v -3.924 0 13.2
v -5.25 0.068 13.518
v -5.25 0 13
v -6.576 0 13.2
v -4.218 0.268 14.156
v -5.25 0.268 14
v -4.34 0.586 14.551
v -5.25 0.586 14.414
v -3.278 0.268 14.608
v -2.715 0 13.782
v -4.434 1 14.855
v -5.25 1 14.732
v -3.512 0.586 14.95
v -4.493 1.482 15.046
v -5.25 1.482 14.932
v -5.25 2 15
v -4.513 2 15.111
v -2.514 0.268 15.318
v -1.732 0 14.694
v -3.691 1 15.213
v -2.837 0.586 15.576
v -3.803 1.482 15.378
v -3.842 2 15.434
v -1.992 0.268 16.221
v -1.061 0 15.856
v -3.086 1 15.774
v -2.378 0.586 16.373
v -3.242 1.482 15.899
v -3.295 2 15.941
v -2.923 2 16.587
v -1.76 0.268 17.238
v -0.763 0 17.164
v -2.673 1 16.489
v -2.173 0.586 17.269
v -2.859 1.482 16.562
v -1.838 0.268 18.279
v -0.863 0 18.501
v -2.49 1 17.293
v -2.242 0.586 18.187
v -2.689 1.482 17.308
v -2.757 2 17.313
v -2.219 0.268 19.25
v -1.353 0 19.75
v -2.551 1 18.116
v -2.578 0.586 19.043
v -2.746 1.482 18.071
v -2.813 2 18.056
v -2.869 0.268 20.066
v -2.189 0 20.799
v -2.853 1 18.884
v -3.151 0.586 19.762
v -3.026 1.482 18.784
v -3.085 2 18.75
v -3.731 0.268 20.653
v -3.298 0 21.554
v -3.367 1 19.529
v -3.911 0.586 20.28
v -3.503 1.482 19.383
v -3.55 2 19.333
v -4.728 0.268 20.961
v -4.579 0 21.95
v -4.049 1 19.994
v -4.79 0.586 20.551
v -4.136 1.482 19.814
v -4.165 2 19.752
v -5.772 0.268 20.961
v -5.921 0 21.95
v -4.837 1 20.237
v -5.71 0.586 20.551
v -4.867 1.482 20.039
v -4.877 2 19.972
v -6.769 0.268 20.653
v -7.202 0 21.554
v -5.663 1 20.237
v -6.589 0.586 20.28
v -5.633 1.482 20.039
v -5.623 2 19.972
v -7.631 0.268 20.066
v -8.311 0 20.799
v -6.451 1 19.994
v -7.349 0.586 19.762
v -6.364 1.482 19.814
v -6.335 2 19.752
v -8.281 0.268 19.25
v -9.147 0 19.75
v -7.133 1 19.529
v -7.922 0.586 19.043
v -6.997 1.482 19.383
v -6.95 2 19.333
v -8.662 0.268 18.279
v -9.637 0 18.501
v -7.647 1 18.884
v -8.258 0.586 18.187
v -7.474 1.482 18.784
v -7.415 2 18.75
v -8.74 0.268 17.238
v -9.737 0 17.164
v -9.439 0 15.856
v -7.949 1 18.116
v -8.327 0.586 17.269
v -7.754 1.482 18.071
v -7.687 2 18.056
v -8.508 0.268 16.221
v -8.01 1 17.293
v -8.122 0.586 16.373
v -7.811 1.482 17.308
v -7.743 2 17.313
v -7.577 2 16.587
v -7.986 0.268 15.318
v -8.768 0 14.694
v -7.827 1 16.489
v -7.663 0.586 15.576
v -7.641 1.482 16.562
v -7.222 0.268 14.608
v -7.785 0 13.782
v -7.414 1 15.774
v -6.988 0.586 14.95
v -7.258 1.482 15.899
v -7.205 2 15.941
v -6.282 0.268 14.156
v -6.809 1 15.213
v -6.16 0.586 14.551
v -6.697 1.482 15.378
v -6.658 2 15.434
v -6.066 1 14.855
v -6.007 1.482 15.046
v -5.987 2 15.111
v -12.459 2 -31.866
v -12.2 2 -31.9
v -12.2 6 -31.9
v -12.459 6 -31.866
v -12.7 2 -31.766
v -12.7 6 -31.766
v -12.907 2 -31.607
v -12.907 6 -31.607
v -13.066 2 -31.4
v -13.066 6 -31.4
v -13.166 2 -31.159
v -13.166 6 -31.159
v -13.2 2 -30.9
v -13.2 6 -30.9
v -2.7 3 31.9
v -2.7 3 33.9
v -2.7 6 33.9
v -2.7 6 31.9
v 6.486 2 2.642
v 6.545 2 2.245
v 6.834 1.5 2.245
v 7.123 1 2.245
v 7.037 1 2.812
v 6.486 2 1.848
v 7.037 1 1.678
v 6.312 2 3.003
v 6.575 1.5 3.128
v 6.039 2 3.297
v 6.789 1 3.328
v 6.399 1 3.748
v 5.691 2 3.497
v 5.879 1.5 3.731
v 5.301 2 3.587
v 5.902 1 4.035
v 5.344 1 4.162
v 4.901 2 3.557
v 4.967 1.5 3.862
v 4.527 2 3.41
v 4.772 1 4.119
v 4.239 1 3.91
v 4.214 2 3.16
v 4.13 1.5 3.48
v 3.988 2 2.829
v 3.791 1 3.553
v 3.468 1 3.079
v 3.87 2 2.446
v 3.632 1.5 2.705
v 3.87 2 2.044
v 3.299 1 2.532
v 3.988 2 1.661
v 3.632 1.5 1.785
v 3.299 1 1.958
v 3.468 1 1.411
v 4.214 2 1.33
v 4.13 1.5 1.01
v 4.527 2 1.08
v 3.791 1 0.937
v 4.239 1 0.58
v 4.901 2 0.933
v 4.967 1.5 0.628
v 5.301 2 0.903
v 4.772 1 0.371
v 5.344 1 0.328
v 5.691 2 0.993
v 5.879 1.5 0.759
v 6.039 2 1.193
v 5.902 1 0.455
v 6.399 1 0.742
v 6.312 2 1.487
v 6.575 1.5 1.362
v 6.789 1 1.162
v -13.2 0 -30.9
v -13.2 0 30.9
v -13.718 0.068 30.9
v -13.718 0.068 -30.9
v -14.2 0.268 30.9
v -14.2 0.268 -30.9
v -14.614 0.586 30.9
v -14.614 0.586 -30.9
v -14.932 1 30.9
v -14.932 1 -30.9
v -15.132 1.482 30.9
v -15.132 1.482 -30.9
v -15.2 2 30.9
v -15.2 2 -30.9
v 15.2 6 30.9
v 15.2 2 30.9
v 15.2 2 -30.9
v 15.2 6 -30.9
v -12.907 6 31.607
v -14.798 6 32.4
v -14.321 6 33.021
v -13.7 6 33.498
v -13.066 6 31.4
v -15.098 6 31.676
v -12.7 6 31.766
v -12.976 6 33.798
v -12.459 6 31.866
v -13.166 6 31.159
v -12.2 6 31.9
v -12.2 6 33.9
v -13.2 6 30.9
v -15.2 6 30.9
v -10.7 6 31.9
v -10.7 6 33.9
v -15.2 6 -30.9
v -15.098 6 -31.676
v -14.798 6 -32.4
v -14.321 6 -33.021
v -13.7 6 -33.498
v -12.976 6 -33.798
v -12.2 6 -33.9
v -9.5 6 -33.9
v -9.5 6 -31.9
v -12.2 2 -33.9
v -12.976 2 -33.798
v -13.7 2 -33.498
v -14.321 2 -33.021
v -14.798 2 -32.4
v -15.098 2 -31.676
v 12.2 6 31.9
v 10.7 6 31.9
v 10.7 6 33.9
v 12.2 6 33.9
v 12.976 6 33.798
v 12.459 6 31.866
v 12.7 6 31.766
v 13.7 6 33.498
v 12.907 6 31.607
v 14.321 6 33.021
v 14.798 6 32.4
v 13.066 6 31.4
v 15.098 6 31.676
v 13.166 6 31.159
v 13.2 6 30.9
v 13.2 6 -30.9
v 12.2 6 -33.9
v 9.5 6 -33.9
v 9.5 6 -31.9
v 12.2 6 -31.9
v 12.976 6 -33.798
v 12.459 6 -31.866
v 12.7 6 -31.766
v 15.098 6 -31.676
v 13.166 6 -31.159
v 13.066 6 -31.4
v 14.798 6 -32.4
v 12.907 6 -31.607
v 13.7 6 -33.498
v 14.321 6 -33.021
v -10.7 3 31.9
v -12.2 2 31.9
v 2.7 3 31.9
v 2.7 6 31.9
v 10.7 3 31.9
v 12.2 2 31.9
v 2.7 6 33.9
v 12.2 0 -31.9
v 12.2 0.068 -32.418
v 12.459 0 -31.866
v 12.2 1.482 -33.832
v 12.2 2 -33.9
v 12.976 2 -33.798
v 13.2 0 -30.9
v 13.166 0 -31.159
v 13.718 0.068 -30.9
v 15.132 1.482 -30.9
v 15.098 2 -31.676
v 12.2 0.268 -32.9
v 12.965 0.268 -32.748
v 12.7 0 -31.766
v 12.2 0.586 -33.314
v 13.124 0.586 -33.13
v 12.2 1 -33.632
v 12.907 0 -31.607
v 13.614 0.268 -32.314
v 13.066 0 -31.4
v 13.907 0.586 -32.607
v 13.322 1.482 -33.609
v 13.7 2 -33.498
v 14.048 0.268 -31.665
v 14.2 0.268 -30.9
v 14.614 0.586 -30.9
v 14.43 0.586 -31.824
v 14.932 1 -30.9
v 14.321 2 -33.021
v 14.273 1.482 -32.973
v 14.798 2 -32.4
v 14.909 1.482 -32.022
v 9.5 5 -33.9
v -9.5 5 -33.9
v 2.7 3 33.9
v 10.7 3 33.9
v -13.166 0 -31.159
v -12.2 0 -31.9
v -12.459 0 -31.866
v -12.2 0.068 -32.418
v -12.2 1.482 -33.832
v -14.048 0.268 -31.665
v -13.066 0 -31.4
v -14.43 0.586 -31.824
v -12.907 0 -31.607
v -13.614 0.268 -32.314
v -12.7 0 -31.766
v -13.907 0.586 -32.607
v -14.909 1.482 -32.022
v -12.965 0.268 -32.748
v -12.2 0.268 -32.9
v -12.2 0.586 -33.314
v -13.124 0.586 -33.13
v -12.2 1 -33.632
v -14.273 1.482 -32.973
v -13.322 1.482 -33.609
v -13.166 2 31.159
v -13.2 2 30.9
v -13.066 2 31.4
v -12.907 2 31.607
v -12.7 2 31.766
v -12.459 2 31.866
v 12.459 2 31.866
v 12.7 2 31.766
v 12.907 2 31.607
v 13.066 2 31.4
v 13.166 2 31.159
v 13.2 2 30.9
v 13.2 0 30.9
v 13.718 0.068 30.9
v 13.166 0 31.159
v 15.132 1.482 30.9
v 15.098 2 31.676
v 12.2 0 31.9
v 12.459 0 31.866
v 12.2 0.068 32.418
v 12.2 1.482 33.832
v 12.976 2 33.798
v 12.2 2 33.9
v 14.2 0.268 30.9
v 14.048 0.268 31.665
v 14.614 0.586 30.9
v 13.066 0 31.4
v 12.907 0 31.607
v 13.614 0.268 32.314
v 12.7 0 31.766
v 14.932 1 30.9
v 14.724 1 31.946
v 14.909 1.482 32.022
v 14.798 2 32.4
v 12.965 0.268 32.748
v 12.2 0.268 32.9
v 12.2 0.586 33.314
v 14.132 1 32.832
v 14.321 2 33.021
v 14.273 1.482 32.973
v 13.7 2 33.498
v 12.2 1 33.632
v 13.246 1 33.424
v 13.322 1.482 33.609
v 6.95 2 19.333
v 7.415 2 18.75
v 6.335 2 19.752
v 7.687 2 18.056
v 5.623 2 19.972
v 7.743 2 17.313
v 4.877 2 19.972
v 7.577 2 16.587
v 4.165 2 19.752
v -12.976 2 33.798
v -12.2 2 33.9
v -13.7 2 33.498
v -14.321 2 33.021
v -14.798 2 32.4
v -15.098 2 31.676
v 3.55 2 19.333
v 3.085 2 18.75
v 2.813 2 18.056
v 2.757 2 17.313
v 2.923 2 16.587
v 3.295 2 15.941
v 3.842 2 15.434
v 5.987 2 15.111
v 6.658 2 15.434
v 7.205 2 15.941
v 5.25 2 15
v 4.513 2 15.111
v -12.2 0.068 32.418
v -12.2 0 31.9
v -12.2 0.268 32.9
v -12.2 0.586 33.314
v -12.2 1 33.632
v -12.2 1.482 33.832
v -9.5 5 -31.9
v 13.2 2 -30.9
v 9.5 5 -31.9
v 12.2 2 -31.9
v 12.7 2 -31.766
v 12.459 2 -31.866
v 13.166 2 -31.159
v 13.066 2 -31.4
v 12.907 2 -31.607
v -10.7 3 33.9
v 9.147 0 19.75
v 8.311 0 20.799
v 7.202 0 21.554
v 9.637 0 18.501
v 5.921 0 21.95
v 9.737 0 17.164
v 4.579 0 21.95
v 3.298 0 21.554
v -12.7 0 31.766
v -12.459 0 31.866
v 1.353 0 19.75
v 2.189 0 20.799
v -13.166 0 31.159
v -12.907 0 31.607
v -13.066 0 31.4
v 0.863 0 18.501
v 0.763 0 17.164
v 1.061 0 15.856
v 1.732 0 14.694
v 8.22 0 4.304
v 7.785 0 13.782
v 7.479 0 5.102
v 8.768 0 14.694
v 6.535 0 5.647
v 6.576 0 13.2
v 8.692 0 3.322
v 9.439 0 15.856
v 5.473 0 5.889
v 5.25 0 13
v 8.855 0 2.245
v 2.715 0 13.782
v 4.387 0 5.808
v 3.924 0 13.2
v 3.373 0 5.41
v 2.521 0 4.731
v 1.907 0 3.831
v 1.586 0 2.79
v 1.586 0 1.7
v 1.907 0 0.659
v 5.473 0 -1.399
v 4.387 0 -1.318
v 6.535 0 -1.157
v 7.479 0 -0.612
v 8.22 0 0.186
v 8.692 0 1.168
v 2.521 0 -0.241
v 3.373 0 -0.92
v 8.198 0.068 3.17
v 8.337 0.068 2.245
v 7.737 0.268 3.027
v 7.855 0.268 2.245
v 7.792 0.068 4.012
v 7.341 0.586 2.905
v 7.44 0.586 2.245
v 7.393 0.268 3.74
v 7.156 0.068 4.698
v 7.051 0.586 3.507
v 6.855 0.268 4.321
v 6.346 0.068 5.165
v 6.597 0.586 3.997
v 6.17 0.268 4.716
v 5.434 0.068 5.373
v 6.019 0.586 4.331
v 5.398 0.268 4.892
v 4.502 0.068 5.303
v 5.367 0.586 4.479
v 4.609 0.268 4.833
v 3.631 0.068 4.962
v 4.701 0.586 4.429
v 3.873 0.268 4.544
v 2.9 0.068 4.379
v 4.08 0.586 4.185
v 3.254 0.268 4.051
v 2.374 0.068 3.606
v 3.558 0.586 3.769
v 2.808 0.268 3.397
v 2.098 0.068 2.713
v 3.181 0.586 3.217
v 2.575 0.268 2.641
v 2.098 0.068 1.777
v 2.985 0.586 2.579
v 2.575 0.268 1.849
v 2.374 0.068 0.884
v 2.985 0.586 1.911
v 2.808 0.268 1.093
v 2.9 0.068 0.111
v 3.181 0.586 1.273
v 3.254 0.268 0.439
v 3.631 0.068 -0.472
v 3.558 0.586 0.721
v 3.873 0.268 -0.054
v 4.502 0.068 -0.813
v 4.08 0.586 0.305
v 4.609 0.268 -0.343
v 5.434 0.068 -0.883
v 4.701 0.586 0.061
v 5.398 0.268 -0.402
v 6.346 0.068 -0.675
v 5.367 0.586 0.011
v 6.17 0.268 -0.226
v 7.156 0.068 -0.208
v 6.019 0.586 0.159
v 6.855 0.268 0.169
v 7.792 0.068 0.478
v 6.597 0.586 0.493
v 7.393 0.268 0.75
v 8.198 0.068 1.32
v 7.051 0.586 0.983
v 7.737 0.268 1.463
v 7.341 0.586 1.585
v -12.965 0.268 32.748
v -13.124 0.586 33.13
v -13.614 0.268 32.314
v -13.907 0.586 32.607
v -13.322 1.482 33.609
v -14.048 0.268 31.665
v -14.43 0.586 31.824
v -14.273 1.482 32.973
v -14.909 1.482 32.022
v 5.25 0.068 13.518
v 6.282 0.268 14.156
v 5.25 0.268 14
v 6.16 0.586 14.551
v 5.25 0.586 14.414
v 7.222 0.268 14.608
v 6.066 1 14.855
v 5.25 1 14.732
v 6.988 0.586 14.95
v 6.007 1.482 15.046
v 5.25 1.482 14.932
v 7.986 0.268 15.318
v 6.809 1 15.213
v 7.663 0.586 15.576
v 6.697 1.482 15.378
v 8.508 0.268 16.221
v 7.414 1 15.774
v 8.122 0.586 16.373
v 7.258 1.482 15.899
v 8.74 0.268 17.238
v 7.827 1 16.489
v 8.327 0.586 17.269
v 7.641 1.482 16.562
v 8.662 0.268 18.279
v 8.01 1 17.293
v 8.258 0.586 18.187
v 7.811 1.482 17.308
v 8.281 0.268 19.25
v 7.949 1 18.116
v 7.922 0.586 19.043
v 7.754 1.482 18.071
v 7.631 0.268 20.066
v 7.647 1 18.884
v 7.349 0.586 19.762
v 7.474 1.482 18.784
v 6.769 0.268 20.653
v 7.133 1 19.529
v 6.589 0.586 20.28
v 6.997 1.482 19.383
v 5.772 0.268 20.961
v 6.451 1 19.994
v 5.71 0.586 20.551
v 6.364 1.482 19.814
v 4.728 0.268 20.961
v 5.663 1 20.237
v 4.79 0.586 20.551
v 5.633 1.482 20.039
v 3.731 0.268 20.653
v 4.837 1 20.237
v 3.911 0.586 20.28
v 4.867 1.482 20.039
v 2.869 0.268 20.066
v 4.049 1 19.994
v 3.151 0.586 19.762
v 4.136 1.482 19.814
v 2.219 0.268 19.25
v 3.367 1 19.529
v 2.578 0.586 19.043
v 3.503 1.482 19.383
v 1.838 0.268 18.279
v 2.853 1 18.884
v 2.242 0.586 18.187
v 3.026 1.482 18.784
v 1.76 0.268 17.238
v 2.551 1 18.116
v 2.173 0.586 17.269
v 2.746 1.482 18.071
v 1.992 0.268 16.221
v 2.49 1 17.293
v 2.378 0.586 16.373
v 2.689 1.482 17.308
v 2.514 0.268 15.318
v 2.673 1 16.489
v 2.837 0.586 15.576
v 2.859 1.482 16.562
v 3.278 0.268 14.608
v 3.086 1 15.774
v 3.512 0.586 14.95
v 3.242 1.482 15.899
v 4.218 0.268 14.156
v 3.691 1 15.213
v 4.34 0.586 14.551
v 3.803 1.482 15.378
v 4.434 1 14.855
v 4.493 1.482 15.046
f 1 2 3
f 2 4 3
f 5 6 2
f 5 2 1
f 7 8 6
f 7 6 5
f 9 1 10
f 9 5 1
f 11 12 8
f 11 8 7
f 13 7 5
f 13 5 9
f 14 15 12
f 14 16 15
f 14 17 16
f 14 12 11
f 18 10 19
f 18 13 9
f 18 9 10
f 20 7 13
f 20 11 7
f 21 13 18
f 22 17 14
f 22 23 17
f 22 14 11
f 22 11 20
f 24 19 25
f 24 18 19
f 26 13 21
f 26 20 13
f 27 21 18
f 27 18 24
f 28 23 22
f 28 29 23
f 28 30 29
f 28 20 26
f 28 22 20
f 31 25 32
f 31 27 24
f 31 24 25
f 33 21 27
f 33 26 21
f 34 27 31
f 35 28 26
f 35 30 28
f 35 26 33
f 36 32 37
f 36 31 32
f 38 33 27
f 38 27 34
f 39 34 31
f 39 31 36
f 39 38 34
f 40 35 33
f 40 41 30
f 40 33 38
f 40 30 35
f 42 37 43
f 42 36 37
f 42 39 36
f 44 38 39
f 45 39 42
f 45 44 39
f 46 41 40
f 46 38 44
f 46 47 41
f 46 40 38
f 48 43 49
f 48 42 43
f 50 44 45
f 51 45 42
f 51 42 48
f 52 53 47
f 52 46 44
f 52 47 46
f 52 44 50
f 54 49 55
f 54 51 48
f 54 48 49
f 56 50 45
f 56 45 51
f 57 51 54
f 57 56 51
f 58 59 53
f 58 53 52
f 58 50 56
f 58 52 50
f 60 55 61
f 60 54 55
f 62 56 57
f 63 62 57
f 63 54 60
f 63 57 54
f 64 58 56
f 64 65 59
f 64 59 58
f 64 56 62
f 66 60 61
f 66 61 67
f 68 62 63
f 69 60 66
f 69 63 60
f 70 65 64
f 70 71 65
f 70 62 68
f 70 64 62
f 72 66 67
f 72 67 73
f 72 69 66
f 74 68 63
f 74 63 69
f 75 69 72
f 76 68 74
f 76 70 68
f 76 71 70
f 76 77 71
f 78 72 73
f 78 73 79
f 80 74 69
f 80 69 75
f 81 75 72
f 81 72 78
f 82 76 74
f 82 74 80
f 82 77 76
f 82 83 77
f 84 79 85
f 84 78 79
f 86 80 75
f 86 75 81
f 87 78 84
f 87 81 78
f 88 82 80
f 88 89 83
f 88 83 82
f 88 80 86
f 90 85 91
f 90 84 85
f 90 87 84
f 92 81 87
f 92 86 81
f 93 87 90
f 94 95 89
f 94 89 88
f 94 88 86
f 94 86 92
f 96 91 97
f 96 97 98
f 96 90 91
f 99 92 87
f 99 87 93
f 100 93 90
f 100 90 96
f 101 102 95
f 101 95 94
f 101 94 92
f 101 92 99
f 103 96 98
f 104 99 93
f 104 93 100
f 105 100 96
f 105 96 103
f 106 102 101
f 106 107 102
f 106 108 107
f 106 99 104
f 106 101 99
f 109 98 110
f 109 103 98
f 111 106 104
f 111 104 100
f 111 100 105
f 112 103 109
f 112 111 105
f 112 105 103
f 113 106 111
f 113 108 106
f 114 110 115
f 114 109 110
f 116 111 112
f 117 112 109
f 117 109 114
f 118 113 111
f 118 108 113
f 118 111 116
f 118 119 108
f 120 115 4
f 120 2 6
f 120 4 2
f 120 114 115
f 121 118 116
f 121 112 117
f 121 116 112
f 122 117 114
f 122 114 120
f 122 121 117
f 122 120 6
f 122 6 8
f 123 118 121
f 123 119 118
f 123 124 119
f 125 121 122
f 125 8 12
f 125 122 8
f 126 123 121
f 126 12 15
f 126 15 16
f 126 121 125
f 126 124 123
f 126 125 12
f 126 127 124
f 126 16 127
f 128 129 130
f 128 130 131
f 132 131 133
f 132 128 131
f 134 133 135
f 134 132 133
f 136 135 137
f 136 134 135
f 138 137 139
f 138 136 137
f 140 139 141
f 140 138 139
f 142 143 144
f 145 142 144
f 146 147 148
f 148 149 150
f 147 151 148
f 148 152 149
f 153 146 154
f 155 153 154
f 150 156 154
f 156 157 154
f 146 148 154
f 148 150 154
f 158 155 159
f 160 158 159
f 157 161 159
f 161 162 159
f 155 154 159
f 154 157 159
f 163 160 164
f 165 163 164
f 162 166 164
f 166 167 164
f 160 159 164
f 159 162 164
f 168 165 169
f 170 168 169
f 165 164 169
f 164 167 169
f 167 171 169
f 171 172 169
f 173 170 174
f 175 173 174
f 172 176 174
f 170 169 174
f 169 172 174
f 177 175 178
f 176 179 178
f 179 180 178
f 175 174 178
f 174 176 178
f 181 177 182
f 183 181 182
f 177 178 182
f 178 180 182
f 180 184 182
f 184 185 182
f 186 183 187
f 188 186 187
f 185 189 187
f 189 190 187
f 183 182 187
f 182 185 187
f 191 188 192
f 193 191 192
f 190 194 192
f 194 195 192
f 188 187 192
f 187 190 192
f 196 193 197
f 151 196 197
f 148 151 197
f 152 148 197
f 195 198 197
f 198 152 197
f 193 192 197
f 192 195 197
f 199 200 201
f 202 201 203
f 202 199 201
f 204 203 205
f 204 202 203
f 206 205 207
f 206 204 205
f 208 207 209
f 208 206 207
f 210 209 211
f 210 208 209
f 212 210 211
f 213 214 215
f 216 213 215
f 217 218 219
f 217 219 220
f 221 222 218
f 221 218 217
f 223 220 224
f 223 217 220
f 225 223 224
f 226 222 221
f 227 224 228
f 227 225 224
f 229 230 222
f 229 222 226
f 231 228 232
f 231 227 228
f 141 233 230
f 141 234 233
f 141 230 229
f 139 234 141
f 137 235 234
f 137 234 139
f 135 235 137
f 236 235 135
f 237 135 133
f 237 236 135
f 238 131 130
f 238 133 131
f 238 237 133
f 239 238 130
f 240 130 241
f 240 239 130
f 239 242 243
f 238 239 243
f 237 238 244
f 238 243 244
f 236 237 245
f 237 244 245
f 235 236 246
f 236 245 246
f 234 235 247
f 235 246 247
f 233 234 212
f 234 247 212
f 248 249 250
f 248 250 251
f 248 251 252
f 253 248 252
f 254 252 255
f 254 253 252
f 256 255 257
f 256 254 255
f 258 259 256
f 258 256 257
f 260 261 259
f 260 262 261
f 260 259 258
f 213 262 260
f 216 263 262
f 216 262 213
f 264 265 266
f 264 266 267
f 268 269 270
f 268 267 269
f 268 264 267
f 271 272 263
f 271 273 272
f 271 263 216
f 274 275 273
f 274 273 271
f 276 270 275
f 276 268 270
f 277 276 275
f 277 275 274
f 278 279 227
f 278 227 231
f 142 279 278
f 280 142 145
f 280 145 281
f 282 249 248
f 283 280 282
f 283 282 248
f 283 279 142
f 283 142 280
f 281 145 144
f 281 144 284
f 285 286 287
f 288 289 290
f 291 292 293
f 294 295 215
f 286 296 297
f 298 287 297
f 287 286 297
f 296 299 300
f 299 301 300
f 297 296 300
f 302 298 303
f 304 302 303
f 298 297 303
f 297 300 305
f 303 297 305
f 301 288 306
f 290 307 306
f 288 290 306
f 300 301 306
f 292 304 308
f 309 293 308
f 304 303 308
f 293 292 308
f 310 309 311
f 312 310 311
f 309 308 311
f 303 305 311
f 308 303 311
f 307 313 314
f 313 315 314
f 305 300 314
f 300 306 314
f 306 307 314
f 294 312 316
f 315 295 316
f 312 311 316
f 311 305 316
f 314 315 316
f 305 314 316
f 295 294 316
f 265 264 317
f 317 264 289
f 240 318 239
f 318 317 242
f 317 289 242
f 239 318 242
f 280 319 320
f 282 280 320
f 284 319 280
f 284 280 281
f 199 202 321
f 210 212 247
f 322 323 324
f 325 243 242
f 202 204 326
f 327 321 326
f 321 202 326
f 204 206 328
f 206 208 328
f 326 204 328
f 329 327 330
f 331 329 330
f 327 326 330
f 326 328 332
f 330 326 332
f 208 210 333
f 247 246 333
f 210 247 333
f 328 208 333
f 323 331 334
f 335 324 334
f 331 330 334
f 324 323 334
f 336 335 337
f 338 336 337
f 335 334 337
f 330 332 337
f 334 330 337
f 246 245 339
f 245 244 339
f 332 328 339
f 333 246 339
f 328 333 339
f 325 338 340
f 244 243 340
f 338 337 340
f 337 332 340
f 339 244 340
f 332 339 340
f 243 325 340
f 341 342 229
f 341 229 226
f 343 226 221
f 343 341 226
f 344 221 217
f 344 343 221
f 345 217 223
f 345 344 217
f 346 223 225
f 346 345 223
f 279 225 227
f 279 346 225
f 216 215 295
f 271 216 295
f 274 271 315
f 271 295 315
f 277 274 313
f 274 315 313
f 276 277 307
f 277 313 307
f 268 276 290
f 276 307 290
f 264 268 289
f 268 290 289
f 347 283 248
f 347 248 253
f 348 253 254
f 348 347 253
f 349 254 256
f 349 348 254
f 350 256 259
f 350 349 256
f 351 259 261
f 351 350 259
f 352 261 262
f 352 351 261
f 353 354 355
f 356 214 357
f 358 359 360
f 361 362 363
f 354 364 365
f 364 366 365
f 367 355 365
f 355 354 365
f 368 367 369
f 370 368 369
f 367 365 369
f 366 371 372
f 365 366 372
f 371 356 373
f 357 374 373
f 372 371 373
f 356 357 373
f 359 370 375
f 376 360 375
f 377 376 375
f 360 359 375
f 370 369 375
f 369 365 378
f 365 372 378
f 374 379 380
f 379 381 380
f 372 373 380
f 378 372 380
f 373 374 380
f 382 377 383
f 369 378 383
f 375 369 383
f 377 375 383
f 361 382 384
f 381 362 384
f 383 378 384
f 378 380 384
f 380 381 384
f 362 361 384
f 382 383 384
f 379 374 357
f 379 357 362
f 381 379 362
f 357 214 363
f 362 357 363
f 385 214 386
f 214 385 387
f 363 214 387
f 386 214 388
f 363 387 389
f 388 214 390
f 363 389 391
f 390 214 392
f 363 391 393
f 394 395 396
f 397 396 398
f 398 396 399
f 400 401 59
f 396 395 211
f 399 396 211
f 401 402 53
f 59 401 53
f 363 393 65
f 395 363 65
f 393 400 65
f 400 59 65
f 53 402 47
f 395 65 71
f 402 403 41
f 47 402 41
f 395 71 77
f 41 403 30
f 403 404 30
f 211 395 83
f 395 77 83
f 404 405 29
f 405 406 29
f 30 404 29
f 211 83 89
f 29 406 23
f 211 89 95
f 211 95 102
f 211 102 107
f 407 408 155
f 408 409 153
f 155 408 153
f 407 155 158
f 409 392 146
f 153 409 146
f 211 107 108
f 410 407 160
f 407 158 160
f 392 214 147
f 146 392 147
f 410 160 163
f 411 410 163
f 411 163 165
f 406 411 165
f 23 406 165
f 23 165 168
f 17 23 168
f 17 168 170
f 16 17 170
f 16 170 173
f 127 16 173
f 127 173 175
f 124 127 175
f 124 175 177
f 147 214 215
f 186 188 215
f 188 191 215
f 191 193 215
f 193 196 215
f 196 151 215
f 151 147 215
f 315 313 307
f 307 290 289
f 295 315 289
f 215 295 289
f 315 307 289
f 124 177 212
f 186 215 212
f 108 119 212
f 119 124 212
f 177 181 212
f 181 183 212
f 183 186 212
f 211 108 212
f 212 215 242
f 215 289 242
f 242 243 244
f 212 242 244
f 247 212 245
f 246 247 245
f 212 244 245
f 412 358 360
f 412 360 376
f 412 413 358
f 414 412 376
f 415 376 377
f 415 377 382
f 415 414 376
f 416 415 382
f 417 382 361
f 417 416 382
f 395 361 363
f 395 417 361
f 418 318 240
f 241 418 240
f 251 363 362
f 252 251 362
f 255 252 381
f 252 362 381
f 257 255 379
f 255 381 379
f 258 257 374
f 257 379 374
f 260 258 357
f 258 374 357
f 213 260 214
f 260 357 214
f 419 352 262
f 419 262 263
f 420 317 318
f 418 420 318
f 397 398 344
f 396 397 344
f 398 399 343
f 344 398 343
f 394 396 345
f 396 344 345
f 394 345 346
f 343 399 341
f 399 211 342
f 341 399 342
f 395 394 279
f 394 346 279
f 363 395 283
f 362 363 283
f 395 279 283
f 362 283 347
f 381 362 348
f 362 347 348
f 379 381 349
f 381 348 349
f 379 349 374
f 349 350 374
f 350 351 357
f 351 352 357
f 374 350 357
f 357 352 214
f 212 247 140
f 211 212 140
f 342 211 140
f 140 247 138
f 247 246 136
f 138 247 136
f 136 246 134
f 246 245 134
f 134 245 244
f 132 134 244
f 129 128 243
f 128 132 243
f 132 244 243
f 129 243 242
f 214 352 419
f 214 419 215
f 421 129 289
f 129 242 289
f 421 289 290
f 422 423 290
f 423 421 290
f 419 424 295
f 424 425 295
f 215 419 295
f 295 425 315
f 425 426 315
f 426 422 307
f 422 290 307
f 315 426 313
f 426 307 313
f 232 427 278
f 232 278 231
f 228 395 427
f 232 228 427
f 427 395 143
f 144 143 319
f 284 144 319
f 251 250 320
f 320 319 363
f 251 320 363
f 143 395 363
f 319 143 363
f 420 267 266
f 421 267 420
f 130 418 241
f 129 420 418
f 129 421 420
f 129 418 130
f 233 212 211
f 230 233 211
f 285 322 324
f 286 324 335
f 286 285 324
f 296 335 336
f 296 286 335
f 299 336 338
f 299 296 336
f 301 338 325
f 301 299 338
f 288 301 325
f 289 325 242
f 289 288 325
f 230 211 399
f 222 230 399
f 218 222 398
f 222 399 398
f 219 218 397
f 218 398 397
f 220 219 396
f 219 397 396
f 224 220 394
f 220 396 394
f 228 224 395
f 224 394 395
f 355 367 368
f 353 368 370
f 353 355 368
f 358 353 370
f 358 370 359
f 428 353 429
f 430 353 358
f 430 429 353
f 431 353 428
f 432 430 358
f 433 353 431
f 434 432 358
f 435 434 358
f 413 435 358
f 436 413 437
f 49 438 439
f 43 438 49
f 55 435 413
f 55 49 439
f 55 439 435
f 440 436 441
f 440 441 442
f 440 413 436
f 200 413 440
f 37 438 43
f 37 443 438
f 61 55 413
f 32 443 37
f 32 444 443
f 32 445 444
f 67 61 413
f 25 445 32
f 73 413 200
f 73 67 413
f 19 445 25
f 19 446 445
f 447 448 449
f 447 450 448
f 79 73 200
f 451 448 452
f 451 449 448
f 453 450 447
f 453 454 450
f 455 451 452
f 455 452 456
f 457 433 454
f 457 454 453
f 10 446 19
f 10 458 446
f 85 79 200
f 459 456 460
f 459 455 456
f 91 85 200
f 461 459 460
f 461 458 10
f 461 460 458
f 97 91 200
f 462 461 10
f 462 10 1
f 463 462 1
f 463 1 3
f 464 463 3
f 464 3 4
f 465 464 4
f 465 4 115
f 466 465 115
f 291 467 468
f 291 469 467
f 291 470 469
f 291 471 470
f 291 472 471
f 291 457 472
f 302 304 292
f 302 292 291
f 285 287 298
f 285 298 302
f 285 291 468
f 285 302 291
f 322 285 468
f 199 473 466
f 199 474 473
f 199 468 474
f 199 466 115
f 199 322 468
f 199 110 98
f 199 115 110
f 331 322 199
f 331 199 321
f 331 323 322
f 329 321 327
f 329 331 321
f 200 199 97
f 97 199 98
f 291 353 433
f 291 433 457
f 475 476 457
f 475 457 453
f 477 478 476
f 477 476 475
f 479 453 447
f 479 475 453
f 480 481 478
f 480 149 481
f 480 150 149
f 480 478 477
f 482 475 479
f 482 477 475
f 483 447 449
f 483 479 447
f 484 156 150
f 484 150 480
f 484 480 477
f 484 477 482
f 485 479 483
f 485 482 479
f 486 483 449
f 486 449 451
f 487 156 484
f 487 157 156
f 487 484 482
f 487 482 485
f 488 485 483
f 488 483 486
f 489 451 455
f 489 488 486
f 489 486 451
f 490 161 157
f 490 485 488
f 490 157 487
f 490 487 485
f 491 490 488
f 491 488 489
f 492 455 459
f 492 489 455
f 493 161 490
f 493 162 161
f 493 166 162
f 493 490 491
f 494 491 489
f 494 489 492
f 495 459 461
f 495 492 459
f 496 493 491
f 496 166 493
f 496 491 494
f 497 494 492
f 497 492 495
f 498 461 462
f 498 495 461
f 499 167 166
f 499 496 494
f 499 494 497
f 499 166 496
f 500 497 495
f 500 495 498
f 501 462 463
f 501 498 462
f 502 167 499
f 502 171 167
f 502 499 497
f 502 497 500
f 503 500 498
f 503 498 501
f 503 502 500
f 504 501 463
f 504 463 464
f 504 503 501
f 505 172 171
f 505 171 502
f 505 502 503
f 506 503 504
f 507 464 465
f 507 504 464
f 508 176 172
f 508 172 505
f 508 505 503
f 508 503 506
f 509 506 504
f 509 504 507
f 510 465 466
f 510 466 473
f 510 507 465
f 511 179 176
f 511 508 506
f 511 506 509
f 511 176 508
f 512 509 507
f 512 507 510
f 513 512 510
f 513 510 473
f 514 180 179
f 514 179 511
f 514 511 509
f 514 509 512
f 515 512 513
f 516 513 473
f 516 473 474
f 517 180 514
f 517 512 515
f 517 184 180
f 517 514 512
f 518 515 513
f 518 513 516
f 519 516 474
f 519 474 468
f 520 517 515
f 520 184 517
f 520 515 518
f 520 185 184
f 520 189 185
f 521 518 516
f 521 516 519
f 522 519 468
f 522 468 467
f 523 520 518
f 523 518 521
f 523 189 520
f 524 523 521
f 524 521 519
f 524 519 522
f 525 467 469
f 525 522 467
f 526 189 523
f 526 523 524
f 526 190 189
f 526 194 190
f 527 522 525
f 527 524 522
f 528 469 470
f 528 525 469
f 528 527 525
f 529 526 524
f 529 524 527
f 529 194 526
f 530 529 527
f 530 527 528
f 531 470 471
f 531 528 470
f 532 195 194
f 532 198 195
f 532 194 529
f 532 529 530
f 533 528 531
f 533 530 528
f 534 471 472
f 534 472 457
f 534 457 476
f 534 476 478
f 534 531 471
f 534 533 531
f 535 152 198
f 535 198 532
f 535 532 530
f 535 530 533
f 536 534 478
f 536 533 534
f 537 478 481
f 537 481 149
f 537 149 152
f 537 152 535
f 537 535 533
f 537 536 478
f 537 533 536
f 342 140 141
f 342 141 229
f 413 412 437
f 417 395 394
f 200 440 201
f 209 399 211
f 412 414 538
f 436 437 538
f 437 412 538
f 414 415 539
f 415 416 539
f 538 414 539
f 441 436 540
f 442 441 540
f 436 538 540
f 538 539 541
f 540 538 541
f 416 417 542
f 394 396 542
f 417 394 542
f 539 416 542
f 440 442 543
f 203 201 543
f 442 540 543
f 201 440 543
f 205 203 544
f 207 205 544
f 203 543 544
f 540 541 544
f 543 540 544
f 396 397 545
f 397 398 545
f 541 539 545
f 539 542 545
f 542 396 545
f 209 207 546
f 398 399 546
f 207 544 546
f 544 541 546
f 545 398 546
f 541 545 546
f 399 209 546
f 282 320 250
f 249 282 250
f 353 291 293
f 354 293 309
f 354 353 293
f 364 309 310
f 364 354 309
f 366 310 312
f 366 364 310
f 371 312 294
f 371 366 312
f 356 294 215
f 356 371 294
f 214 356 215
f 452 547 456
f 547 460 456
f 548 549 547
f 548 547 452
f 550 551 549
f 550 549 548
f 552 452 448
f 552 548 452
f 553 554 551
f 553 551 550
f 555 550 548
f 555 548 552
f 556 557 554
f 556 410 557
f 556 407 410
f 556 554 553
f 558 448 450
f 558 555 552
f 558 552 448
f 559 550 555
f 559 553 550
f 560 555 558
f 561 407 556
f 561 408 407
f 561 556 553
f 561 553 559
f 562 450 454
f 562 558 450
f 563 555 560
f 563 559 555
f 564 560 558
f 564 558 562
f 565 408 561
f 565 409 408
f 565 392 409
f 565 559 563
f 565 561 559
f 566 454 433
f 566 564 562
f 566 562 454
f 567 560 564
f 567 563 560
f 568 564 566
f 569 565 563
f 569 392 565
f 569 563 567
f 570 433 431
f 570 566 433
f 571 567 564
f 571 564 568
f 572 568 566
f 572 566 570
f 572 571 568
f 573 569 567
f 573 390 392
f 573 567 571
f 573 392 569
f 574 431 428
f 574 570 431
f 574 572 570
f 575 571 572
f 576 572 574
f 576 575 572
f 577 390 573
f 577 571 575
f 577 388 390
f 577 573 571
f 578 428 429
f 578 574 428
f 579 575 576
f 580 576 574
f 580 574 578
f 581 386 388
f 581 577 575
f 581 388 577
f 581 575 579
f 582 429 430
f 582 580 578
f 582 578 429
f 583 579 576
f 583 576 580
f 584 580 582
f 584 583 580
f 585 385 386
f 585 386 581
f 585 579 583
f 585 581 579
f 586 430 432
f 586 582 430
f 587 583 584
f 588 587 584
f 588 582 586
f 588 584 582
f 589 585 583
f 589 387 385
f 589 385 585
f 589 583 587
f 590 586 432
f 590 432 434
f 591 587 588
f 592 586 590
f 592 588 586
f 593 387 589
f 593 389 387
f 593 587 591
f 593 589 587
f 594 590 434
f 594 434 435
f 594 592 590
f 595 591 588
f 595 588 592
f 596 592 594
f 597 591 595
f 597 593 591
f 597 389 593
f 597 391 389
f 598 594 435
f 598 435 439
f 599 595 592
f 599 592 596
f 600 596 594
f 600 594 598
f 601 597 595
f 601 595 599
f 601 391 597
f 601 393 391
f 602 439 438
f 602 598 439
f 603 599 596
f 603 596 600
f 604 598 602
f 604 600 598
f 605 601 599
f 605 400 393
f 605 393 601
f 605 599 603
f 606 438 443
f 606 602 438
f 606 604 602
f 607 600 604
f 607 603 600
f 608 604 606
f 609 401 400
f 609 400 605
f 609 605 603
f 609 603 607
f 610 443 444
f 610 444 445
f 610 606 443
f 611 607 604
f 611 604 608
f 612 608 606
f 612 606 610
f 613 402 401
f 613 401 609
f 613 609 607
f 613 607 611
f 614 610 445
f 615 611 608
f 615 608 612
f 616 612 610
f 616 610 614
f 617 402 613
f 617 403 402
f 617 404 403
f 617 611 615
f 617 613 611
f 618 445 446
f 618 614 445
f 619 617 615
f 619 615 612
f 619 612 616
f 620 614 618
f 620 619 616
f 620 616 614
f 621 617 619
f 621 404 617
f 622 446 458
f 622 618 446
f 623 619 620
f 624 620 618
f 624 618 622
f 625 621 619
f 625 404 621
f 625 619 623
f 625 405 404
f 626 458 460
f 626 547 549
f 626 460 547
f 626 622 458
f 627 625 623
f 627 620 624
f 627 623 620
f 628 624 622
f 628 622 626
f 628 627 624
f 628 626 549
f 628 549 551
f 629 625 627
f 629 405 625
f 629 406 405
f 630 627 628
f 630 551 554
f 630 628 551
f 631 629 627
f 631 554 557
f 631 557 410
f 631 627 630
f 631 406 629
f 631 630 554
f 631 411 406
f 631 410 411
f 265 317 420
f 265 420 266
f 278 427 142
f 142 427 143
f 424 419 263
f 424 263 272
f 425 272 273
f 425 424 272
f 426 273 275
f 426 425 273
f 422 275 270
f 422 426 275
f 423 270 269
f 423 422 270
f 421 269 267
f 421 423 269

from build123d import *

# Parameters (mm, degrees)
BOSS_EXTRUDE1_DEPTH = 2
BOSS_EXTRUDE2_DEPTH = 4
SKETCH3_W           = 8
SKETCH3_H           = 3
CUT_EXTRUDE1_DEPTH  = 10
SKETCH4_W           = 19
SKETCH4_H           = 1
CUT_EXTRUDE2_DEPTH  = 10
SKETCH5_R           = 2.5
CUT_EXTRUDE3_DEPTH  = 2
CUT_EXTRUDE3_DRAFT  = -30
SKETCH6_R           = 2.5
CUT_EXTRUDE4_DEPTH  = 2
FILLET1_R           = 2


with BuildPart() as part:
    # Sketch1 → Boss-Extrude1 (new body)
    with BuildSketch(Plane(origin=(0, 0, 0), x_dir=(1, 0, 0), z_dir=(0, 1, 0))):
        with BuildLine():
            Line((-12.2, 33.9), (12.2, 33.9))
            ThreePointArc((12.2, 33.9), (14.321320344, 33.021320344), (15.2, 30.9))
            Line((15.2, 30.9), (15.2, -30.9))
            ThreePointArc((15.2, -30.9), (14.321320344, -33.021320344), (12.2, -33.9))
            Line((12.2, -33.9), (-12.2, -33.9))
            ThreePointArc((-12.2, -33.9), (-14.321320344, -33.021320344), (-15.2, -30.9))
            Line((-15.2, -30.9), (-15.2, 30.9))
            ThreePointArc((-15.2, 30.9), (-14.321320344, 33.021320344), (-12.2, 33.9))
        make_face()
    extrude(amount=BOSS_EXTRUDE1_DEPTH)


with BuildPart() as body_2:
    # Sketch2 → Boss-Extrude2 (new body)
    with BuildSketch(Plane(origin=(0, 2, 0), x_dir=(1, 0, 0), z_dir=(0, 1, 0))):
        with BuildLine():
            Line((-12.2, -33.9), (12.2, -33.9))
            ThreePointArc((12.2, -33.9), (14.321320344, -33.021320344), (15.2, -30.9))
            Line((15.2, -30.9), (15.2, 30.9))
            ThreePointArc((15.2, 30.9), (14.321320344, 33.021320344), (12.2, 33.9))
            Line((12.2, 33.9), (-12.2, 33.9))
            ThreePointArc((-12.2, 33.9), (-14.321320344, 33.021320344), (-15.2, 30.9))
            Line((-15.2, 30.9), (-15.2, -30.9))
            ThreePointArc((-15.2, -30.9), (-14.321320344, -33.021320344), (-12.2, -33.9))
        make_face()
        with BuildLine():
            Line((-12.2, -31.9), (12.2, -31.9))
            ThreePointArc((12.2, -31.9), (12.907106781, -31.607106781), (13.2, -30.9))
            Line((13.2, -30.9), (13.2, 30.9))
            ThreePointArc((13.2, 30.9), (12.907106781, 31.607106781), (12.2, 31.9))
            Line((12.2, 31.9), (-12.2, 31.9))
            ThreePointArc((-12.2, 31.9), (-12.907106781, 31.607106781), (-13.2, 30.9))
            Line((-13.2, 30.9), (-13.2, -30.9))
            ThreePointArc((-13.2, -30.9), (-12.907106781, -31.607106781), (-12.2, -31.9))
        make_face(mode=Mode.SUBTRACT)
    extrude(amount=BOSS_EXTRUDE2_DEPTH)

    # Sketch3 → Cut-Extrude1 (cut)
    with BuildSketch(Plane.XY.offset(33.9)):
        with Locations((6.7, 4.5)):
            Rectangle(SKETCH3_W, SKETCH3_H)
        with Locations((-6.7, 4.5)):
            Rectangle(SKETCH3_W, SKETCH3_H)
    extrude(amount=-CUT_EXTRUDE1_DEPTH, mode=Mode.SUBTRACT)

    # Sketch4 → Cut-Extrude2 (cut)
    with BuildSketch(Plane(origin=(0, 0, -33.9), x_dir=(-1, 0, 0), z_dir=(0, 0, -1))):
        with Locations((0, 5.5)):
            Rectangle(SKETCH4_W, SKETCH4_H)
    extrude(amount=-CUT_EXTRUDE2_DEPTH, mode=Mode.SUBTRACT)


with BuildPart() as cut_extrude3_tool:
    # Sketch5 → Cut-Extrude3 (with draft: the straight prism first)
    with BuildSketch(Plane.XZ):
        with Locations((5.2, 2.244994432)):
            Circle(SKETCH5_R)
    extrude(amount=-CUT_EXTRUDE3_DEPTH)
    # Cut-Extrude3: the draft: its side faces are tilted about the plane it starts from
    cut_extrude3_sides = [cut_extrude3_tool.faces().sort_by_distance(p)[0] for p in [
        (2.7, 1, 2.244994432),
    ]]
    draft(cut_extrude3_sides, Plane.XZ, CUT_EXTRUDE3_DRAFT)


with BuildPart() as part_1:
    add(part.part)

    # Cut-Extrude3: cut by cut_extrude3_tool
    add(cut_extrude3_tool.part, mode=Mode.SUBTRACT)

    # Sketch6 → Cut-Extrude4 (cut)
    with BuildSketch(Plane.XZ):
        with Locations(Location((5.25, 17.5, 0), (0, 0, 270))):
            Circle(SKETCH6_R)
        with Locations(Location((-5.25, 17.5, 0), (0, 0, 270))):
            Circle(SKETCH6_R)
    extrude(amount=-CUT_EXTRUDE4_DEPTH, mode=Mode.SUBTRACT)

    # Fillet1
    fillet1_edges = [part_1.edges().sort_by_distance(p)[0] for p in [
        (0, 0, 33.9),
        (14.321320344, 0, 33.021320344),
        (15.2, 0, 0),
        (14.321320344, 0, -33.021320344),
        (0, 0, -33.9),
        (-14.321320344, 0, -33.021320344),
        (-15.2, 0, 0),
        (-14.321320344, 0, 33.021320344),
        (2.7, 0, 2.244994432),
        (-5.25, 0, 20),
        (5.25, 0, 20),
    ]]
    fillet(fillet1_edges, radius=FILLET1_R - 0.0001)  # a hair under: the kernel refuses the full size


solid = Compound([body_2.part, part_1.part])
